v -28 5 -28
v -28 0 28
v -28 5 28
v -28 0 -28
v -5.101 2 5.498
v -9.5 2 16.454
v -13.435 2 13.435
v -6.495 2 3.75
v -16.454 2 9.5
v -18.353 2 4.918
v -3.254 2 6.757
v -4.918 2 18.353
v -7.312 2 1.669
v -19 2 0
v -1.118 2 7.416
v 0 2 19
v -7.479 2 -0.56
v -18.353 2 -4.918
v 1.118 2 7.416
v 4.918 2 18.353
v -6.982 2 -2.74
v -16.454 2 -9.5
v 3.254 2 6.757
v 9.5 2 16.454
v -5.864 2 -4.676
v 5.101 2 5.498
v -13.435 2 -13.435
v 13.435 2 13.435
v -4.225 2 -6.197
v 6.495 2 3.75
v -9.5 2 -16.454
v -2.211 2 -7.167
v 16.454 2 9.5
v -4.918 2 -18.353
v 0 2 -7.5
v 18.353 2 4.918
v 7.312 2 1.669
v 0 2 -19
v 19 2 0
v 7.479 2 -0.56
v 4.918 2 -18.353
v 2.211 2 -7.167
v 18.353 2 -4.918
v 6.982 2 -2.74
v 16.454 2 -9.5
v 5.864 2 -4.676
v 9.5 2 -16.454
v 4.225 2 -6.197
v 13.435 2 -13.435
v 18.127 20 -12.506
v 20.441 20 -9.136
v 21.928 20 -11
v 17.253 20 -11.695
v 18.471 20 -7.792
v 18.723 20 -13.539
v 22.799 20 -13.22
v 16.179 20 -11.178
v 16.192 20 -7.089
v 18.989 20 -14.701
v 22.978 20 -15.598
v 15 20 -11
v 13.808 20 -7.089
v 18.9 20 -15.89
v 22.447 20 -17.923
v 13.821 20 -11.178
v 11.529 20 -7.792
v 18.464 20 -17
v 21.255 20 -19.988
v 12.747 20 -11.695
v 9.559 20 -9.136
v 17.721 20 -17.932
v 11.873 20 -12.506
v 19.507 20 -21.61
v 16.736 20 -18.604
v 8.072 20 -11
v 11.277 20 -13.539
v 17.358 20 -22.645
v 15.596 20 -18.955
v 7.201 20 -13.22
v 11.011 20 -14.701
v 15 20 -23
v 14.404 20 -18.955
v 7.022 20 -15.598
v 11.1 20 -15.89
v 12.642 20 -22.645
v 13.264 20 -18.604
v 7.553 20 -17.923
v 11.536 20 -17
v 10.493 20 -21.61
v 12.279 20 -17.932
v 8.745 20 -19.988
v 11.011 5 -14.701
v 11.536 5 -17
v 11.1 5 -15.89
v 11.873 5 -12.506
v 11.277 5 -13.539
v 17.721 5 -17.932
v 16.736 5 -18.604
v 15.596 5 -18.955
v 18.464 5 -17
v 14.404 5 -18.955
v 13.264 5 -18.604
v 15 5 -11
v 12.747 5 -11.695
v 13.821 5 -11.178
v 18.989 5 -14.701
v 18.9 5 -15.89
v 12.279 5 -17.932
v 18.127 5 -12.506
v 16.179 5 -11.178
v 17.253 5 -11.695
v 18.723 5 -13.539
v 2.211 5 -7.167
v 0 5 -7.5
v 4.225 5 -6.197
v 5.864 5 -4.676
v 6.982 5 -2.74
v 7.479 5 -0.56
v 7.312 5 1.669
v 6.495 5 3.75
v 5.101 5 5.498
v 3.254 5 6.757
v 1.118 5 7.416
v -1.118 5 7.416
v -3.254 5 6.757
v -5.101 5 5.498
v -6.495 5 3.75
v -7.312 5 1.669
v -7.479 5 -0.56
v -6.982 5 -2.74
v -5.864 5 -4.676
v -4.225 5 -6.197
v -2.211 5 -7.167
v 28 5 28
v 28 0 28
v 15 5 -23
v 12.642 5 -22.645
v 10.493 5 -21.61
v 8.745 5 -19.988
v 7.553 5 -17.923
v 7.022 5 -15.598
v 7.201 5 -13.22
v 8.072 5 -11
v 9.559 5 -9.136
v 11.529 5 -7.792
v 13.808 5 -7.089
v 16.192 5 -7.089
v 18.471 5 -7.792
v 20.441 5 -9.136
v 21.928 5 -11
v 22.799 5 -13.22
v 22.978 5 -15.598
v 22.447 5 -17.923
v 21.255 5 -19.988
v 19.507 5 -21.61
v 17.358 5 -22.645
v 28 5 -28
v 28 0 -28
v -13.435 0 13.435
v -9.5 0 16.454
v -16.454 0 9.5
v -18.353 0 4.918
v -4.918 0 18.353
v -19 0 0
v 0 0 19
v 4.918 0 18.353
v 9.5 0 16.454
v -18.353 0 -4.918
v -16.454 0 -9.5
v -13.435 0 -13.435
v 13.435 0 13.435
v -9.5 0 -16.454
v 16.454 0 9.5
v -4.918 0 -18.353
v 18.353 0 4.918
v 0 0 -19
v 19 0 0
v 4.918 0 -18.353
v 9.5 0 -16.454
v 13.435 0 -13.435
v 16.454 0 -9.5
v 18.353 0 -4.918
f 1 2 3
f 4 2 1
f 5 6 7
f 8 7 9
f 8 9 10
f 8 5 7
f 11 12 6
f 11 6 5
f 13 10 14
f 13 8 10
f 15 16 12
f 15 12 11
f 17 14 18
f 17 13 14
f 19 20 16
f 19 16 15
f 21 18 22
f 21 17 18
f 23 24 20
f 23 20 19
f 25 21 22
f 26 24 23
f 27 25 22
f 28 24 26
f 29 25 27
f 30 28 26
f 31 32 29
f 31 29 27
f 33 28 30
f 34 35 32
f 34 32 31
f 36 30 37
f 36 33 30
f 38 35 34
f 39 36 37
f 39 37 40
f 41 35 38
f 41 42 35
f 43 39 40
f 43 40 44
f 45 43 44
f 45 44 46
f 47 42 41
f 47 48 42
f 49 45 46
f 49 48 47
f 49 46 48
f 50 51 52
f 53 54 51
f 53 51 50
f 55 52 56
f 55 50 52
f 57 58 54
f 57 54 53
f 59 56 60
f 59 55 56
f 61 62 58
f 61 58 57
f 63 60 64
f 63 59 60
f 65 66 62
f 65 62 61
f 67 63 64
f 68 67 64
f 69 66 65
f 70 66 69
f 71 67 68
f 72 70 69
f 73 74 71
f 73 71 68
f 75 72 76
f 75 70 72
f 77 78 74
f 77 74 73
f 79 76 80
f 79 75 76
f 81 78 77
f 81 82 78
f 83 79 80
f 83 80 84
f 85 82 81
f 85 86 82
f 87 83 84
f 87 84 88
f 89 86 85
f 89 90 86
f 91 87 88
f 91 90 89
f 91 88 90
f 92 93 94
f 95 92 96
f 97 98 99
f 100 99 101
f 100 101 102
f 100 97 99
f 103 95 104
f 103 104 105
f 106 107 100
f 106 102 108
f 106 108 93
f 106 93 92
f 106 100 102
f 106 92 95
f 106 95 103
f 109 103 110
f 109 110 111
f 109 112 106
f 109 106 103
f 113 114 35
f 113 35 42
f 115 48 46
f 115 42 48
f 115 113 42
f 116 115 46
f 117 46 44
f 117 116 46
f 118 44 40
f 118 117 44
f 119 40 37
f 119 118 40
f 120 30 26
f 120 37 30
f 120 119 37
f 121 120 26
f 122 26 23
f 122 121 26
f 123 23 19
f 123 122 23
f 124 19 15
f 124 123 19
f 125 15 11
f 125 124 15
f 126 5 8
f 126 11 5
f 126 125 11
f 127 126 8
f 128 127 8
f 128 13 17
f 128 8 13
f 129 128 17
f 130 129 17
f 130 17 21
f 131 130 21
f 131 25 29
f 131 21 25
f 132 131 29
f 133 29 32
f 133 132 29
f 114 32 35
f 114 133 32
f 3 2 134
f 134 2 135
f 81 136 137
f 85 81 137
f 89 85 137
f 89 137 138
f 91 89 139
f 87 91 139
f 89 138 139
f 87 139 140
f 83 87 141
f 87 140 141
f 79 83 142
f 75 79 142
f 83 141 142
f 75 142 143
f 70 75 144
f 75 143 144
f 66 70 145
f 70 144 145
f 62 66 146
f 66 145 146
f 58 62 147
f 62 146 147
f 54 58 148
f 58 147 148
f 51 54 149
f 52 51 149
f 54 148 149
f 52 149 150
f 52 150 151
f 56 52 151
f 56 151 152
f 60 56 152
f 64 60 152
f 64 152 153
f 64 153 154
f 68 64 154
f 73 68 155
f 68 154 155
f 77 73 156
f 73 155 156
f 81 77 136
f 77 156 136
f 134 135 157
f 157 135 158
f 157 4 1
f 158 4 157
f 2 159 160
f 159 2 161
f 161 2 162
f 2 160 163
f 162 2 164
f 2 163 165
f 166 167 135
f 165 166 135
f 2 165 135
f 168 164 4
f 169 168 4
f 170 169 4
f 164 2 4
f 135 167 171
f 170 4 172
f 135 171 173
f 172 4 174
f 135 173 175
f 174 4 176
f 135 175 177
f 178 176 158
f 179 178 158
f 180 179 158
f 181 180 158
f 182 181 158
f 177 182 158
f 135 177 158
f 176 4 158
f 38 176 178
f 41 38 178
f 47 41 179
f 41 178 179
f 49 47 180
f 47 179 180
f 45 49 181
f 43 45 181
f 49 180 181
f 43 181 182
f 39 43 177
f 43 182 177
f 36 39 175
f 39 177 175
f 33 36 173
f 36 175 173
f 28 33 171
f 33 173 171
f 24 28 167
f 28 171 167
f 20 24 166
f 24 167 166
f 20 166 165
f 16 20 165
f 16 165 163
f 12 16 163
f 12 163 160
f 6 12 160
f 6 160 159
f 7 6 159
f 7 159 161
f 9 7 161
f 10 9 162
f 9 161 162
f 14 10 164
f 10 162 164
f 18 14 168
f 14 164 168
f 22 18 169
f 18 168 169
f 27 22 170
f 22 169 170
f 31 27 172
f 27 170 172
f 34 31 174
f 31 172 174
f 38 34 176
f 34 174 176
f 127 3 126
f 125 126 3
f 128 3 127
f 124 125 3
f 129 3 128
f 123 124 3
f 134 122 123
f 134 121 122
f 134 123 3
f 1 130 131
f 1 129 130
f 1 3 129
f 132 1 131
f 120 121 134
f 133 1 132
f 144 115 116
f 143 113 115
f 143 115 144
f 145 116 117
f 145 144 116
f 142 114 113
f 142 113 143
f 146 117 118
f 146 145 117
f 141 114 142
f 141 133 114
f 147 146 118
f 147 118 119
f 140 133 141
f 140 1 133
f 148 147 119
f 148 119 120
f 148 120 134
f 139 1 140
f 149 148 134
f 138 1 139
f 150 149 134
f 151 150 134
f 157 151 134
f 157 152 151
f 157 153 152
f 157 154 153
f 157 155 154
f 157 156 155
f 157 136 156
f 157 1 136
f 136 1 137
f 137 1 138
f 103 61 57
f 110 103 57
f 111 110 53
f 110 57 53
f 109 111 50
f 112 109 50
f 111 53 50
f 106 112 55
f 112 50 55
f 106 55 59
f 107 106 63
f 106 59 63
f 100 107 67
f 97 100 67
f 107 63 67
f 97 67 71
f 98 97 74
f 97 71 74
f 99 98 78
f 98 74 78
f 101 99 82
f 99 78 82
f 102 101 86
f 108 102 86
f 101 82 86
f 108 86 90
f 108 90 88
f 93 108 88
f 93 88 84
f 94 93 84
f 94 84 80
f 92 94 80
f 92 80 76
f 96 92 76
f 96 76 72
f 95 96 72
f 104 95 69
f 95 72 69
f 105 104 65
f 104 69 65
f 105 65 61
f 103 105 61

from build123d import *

# Parameters (mm, degrees)
SKETCH1_W               = 56
SKETCH1_H               = 56
BOSS_EXTRUDE1_DEPTH     = 5
SKETCH2_R               = 8
BOSS_EXTRUDE2_DEPTH     = 15
SKETCH4_R               = 19
CUT_EXTRUDE2_DEPTH      = 2
CUT_EXTRUDE3_DEPTH      = 44.497126342
CUT_EXTRUDE3_DEPTH_BACK = 44.497126342
SKETCH5_R               = 7.5
SKETCH6_R               = 4
CUT_EXTRUDE4_DEPTH      = 15


with BuildPart() as part:
    # Sketch1 → Boss-Extrude1 (new body)
    with BuildSketch(Plane(origin=(0, 0, 0), x_dir=(1, 0, 0), z_dir=(0, 1, 0))):
        Rectangle(SKETCH1_W, SKETCH1_H)
    extrude(amount=BOSS_EXTRUDE1_DEPTH)

    # Sketch2 → Boss-Extrude2 (add)
    with BuildSketch(Plane(origin=(0, 5, 0), x_dir=(1, 0, 0), z_dir=(0, 1, 0))):
        with Locations(Location((15, 15, 0), (0, 0, 90))):
            Circle(SKETCH2_R)
    extrude(amount=BOSS_EXTRUDE2_DEPTH)

    # Sketch4 → Cut-Extrude2 (cut)
    with BuildSketch(Plane.XZ):
        with Locations(Location((0, 0, 0), (0, 0, 270))):
            Circle(SKETCH4_R)
    extrude(amount=-CUT_EXTRUDE2_DEPTH, mode=Mode.SUBTRACT)

    # Sketch5 → Cut-Extrude3 (cut, two sides: drawn at the far end of the back side and taken through both)
    with BuildSketch(Plane.XZ.offset(-2).offset(-CUT_EXTRUDE3_DEPTH_BACK)):
        with Locations(Location((0, 0, 0), (0, 0, 270))):
            Circle(SKETCH5_R)
    extrude(amount=CUT_EXTRUDE3_DEPTH + CUT_EXTRUDE3_DEPTH_BACK, mode=Mode.SUBTRACT)

    # Sketch6 → Cut-Extrude4 (cut)
    with BuildSketch(Plane(origin=(0, 20, 0), x_dir=(1, 0, 0), z_dir=(0, 1, 0))):
        with Locations(Location((15, 15, 0), (0, 0, 270))):
            Circle(SKETCH6_R)
    extrude(amount=-CUT_EXTRUDE4_DEPTH, mode=Mode.SUBTRACT)


solid = part.part
